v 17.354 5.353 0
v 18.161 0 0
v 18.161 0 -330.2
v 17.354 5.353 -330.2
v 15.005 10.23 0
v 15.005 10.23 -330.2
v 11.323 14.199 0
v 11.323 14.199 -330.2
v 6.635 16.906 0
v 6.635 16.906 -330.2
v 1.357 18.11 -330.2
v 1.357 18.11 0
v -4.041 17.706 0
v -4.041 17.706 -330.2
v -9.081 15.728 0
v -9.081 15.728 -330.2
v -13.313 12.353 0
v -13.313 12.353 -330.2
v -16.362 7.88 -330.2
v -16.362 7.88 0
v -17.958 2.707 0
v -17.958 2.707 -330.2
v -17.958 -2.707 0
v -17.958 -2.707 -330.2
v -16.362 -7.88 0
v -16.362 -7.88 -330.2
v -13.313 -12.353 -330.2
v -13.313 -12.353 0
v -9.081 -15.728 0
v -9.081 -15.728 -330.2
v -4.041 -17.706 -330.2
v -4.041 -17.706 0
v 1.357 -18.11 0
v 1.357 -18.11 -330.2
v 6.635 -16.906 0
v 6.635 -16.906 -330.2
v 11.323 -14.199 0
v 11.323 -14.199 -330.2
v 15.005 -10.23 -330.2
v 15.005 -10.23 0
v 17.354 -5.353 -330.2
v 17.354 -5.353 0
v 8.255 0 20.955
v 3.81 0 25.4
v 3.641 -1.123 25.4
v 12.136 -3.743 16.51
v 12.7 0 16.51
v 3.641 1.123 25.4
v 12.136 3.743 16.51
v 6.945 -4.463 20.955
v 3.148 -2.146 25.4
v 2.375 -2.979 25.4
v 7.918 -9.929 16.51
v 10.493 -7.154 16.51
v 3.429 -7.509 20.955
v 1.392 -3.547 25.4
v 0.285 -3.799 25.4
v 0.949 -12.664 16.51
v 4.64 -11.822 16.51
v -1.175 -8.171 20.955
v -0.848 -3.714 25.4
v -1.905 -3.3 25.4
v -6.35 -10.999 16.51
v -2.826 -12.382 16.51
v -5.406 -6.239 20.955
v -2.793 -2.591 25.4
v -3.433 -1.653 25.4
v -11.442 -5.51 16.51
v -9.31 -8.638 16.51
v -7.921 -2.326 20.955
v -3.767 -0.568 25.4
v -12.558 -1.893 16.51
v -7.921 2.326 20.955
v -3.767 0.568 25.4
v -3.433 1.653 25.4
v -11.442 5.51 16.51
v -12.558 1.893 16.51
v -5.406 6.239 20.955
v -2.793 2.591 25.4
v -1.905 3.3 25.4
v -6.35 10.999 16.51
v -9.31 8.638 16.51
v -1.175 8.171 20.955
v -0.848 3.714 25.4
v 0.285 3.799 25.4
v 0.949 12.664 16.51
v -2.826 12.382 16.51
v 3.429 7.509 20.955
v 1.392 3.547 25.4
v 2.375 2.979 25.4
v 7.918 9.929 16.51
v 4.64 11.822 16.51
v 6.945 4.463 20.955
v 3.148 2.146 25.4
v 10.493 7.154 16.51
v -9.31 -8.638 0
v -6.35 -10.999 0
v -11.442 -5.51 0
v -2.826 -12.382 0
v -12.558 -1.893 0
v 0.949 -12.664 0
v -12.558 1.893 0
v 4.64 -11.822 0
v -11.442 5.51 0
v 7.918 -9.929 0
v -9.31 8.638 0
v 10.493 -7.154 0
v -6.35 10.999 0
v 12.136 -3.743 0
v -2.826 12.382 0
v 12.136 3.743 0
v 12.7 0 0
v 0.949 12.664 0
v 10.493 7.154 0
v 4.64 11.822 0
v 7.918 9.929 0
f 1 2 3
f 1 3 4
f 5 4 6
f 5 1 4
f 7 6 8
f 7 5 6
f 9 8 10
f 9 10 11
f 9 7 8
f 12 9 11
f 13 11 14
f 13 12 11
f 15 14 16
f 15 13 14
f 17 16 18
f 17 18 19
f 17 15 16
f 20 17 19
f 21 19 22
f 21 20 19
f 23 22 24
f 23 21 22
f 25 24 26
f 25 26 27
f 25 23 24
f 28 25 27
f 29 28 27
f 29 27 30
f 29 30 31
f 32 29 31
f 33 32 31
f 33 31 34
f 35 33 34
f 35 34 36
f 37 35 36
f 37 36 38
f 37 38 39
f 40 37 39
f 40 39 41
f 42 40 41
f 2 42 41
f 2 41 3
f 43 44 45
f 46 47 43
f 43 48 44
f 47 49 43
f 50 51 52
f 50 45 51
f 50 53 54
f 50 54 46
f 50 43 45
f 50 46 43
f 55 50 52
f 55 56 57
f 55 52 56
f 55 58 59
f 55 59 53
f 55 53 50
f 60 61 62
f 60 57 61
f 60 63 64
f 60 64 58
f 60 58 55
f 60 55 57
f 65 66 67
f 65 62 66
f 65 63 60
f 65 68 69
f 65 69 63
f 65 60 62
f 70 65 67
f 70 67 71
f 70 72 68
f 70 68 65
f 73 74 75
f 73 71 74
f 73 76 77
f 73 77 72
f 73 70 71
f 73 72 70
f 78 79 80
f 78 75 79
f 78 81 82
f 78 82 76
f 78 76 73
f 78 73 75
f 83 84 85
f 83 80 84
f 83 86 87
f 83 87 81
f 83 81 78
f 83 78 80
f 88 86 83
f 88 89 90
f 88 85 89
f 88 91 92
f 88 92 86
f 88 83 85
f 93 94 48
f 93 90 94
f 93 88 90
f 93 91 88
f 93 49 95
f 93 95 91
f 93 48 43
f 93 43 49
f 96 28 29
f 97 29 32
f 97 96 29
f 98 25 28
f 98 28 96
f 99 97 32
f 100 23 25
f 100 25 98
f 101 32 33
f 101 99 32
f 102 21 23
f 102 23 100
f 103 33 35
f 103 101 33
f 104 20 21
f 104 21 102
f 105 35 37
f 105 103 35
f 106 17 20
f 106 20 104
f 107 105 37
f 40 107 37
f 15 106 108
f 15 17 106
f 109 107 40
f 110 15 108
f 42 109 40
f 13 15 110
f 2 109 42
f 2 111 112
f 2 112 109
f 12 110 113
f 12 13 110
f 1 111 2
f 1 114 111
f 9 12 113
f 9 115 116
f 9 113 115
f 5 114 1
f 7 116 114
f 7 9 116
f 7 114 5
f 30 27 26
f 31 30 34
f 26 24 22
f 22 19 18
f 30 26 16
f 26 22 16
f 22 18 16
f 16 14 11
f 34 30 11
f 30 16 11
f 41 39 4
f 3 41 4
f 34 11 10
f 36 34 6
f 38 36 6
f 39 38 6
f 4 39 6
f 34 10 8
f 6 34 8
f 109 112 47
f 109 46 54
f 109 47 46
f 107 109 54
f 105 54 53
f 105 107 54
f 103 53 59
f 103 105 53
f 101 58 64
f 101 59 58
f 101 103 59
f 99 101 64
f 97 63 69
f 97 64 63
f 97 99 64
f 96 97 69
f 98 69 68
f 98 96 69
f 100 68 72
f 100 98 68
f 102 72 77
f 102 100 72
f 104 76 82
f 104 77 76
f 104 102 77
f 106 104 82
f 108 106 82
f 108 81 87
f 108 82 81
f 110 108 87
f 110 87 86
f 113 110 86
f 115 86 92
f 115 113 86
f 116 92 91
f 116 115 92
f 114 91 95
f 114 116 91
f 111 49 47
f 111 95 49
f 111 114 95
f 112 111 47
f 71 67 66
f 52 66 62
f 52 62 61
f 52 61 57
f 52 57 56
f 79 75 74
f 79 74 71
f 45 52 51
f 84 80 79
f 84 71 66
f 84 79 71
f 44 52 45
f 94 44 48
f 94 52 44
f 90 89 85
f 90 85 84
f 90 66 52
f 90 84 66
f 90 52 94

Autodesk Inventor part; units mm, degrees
ref_plane "YZ Plane" through (0, 0, 0) normal (1, 0, 0) x (0, 1, 0)
ref_plane "XZ Plane" through (0, 0, 0) normal (0, 1, 0) x (-1, 0, 0)
ref_plane "XY Plane" through (0, 0, 0) normal (0, 0, 1) x (1, 0, 0)
sketch "Sketch1" plane through (0, 0, 0) normal (0, 0, 1) x (1, 0, 0)
  circle A0 centre (0, 0) radius 18.161
  dimension "d0" = 36.322
extrude "Extrusion1" add sketch "Sketch1" against normal blind 330.2
sketch "Sketch2" plane through (0, 0, 0) normal (0, 0, 1) x (1, 0, 0)
  circle A0 centre (0, 0) radius 18.161 projected
  circle A1 centre (0, 0) radius 12.7
  dimension "d3" = 25.4
extrude "Extrusion2" add sketch "Sketch2" along normal blind 25.4 contours A1
chamfer "Chamfer1" distance 8.89 angle 45 1 edges at (-12.7, 0, 25.4)
properties part number "machineTorchHead"
